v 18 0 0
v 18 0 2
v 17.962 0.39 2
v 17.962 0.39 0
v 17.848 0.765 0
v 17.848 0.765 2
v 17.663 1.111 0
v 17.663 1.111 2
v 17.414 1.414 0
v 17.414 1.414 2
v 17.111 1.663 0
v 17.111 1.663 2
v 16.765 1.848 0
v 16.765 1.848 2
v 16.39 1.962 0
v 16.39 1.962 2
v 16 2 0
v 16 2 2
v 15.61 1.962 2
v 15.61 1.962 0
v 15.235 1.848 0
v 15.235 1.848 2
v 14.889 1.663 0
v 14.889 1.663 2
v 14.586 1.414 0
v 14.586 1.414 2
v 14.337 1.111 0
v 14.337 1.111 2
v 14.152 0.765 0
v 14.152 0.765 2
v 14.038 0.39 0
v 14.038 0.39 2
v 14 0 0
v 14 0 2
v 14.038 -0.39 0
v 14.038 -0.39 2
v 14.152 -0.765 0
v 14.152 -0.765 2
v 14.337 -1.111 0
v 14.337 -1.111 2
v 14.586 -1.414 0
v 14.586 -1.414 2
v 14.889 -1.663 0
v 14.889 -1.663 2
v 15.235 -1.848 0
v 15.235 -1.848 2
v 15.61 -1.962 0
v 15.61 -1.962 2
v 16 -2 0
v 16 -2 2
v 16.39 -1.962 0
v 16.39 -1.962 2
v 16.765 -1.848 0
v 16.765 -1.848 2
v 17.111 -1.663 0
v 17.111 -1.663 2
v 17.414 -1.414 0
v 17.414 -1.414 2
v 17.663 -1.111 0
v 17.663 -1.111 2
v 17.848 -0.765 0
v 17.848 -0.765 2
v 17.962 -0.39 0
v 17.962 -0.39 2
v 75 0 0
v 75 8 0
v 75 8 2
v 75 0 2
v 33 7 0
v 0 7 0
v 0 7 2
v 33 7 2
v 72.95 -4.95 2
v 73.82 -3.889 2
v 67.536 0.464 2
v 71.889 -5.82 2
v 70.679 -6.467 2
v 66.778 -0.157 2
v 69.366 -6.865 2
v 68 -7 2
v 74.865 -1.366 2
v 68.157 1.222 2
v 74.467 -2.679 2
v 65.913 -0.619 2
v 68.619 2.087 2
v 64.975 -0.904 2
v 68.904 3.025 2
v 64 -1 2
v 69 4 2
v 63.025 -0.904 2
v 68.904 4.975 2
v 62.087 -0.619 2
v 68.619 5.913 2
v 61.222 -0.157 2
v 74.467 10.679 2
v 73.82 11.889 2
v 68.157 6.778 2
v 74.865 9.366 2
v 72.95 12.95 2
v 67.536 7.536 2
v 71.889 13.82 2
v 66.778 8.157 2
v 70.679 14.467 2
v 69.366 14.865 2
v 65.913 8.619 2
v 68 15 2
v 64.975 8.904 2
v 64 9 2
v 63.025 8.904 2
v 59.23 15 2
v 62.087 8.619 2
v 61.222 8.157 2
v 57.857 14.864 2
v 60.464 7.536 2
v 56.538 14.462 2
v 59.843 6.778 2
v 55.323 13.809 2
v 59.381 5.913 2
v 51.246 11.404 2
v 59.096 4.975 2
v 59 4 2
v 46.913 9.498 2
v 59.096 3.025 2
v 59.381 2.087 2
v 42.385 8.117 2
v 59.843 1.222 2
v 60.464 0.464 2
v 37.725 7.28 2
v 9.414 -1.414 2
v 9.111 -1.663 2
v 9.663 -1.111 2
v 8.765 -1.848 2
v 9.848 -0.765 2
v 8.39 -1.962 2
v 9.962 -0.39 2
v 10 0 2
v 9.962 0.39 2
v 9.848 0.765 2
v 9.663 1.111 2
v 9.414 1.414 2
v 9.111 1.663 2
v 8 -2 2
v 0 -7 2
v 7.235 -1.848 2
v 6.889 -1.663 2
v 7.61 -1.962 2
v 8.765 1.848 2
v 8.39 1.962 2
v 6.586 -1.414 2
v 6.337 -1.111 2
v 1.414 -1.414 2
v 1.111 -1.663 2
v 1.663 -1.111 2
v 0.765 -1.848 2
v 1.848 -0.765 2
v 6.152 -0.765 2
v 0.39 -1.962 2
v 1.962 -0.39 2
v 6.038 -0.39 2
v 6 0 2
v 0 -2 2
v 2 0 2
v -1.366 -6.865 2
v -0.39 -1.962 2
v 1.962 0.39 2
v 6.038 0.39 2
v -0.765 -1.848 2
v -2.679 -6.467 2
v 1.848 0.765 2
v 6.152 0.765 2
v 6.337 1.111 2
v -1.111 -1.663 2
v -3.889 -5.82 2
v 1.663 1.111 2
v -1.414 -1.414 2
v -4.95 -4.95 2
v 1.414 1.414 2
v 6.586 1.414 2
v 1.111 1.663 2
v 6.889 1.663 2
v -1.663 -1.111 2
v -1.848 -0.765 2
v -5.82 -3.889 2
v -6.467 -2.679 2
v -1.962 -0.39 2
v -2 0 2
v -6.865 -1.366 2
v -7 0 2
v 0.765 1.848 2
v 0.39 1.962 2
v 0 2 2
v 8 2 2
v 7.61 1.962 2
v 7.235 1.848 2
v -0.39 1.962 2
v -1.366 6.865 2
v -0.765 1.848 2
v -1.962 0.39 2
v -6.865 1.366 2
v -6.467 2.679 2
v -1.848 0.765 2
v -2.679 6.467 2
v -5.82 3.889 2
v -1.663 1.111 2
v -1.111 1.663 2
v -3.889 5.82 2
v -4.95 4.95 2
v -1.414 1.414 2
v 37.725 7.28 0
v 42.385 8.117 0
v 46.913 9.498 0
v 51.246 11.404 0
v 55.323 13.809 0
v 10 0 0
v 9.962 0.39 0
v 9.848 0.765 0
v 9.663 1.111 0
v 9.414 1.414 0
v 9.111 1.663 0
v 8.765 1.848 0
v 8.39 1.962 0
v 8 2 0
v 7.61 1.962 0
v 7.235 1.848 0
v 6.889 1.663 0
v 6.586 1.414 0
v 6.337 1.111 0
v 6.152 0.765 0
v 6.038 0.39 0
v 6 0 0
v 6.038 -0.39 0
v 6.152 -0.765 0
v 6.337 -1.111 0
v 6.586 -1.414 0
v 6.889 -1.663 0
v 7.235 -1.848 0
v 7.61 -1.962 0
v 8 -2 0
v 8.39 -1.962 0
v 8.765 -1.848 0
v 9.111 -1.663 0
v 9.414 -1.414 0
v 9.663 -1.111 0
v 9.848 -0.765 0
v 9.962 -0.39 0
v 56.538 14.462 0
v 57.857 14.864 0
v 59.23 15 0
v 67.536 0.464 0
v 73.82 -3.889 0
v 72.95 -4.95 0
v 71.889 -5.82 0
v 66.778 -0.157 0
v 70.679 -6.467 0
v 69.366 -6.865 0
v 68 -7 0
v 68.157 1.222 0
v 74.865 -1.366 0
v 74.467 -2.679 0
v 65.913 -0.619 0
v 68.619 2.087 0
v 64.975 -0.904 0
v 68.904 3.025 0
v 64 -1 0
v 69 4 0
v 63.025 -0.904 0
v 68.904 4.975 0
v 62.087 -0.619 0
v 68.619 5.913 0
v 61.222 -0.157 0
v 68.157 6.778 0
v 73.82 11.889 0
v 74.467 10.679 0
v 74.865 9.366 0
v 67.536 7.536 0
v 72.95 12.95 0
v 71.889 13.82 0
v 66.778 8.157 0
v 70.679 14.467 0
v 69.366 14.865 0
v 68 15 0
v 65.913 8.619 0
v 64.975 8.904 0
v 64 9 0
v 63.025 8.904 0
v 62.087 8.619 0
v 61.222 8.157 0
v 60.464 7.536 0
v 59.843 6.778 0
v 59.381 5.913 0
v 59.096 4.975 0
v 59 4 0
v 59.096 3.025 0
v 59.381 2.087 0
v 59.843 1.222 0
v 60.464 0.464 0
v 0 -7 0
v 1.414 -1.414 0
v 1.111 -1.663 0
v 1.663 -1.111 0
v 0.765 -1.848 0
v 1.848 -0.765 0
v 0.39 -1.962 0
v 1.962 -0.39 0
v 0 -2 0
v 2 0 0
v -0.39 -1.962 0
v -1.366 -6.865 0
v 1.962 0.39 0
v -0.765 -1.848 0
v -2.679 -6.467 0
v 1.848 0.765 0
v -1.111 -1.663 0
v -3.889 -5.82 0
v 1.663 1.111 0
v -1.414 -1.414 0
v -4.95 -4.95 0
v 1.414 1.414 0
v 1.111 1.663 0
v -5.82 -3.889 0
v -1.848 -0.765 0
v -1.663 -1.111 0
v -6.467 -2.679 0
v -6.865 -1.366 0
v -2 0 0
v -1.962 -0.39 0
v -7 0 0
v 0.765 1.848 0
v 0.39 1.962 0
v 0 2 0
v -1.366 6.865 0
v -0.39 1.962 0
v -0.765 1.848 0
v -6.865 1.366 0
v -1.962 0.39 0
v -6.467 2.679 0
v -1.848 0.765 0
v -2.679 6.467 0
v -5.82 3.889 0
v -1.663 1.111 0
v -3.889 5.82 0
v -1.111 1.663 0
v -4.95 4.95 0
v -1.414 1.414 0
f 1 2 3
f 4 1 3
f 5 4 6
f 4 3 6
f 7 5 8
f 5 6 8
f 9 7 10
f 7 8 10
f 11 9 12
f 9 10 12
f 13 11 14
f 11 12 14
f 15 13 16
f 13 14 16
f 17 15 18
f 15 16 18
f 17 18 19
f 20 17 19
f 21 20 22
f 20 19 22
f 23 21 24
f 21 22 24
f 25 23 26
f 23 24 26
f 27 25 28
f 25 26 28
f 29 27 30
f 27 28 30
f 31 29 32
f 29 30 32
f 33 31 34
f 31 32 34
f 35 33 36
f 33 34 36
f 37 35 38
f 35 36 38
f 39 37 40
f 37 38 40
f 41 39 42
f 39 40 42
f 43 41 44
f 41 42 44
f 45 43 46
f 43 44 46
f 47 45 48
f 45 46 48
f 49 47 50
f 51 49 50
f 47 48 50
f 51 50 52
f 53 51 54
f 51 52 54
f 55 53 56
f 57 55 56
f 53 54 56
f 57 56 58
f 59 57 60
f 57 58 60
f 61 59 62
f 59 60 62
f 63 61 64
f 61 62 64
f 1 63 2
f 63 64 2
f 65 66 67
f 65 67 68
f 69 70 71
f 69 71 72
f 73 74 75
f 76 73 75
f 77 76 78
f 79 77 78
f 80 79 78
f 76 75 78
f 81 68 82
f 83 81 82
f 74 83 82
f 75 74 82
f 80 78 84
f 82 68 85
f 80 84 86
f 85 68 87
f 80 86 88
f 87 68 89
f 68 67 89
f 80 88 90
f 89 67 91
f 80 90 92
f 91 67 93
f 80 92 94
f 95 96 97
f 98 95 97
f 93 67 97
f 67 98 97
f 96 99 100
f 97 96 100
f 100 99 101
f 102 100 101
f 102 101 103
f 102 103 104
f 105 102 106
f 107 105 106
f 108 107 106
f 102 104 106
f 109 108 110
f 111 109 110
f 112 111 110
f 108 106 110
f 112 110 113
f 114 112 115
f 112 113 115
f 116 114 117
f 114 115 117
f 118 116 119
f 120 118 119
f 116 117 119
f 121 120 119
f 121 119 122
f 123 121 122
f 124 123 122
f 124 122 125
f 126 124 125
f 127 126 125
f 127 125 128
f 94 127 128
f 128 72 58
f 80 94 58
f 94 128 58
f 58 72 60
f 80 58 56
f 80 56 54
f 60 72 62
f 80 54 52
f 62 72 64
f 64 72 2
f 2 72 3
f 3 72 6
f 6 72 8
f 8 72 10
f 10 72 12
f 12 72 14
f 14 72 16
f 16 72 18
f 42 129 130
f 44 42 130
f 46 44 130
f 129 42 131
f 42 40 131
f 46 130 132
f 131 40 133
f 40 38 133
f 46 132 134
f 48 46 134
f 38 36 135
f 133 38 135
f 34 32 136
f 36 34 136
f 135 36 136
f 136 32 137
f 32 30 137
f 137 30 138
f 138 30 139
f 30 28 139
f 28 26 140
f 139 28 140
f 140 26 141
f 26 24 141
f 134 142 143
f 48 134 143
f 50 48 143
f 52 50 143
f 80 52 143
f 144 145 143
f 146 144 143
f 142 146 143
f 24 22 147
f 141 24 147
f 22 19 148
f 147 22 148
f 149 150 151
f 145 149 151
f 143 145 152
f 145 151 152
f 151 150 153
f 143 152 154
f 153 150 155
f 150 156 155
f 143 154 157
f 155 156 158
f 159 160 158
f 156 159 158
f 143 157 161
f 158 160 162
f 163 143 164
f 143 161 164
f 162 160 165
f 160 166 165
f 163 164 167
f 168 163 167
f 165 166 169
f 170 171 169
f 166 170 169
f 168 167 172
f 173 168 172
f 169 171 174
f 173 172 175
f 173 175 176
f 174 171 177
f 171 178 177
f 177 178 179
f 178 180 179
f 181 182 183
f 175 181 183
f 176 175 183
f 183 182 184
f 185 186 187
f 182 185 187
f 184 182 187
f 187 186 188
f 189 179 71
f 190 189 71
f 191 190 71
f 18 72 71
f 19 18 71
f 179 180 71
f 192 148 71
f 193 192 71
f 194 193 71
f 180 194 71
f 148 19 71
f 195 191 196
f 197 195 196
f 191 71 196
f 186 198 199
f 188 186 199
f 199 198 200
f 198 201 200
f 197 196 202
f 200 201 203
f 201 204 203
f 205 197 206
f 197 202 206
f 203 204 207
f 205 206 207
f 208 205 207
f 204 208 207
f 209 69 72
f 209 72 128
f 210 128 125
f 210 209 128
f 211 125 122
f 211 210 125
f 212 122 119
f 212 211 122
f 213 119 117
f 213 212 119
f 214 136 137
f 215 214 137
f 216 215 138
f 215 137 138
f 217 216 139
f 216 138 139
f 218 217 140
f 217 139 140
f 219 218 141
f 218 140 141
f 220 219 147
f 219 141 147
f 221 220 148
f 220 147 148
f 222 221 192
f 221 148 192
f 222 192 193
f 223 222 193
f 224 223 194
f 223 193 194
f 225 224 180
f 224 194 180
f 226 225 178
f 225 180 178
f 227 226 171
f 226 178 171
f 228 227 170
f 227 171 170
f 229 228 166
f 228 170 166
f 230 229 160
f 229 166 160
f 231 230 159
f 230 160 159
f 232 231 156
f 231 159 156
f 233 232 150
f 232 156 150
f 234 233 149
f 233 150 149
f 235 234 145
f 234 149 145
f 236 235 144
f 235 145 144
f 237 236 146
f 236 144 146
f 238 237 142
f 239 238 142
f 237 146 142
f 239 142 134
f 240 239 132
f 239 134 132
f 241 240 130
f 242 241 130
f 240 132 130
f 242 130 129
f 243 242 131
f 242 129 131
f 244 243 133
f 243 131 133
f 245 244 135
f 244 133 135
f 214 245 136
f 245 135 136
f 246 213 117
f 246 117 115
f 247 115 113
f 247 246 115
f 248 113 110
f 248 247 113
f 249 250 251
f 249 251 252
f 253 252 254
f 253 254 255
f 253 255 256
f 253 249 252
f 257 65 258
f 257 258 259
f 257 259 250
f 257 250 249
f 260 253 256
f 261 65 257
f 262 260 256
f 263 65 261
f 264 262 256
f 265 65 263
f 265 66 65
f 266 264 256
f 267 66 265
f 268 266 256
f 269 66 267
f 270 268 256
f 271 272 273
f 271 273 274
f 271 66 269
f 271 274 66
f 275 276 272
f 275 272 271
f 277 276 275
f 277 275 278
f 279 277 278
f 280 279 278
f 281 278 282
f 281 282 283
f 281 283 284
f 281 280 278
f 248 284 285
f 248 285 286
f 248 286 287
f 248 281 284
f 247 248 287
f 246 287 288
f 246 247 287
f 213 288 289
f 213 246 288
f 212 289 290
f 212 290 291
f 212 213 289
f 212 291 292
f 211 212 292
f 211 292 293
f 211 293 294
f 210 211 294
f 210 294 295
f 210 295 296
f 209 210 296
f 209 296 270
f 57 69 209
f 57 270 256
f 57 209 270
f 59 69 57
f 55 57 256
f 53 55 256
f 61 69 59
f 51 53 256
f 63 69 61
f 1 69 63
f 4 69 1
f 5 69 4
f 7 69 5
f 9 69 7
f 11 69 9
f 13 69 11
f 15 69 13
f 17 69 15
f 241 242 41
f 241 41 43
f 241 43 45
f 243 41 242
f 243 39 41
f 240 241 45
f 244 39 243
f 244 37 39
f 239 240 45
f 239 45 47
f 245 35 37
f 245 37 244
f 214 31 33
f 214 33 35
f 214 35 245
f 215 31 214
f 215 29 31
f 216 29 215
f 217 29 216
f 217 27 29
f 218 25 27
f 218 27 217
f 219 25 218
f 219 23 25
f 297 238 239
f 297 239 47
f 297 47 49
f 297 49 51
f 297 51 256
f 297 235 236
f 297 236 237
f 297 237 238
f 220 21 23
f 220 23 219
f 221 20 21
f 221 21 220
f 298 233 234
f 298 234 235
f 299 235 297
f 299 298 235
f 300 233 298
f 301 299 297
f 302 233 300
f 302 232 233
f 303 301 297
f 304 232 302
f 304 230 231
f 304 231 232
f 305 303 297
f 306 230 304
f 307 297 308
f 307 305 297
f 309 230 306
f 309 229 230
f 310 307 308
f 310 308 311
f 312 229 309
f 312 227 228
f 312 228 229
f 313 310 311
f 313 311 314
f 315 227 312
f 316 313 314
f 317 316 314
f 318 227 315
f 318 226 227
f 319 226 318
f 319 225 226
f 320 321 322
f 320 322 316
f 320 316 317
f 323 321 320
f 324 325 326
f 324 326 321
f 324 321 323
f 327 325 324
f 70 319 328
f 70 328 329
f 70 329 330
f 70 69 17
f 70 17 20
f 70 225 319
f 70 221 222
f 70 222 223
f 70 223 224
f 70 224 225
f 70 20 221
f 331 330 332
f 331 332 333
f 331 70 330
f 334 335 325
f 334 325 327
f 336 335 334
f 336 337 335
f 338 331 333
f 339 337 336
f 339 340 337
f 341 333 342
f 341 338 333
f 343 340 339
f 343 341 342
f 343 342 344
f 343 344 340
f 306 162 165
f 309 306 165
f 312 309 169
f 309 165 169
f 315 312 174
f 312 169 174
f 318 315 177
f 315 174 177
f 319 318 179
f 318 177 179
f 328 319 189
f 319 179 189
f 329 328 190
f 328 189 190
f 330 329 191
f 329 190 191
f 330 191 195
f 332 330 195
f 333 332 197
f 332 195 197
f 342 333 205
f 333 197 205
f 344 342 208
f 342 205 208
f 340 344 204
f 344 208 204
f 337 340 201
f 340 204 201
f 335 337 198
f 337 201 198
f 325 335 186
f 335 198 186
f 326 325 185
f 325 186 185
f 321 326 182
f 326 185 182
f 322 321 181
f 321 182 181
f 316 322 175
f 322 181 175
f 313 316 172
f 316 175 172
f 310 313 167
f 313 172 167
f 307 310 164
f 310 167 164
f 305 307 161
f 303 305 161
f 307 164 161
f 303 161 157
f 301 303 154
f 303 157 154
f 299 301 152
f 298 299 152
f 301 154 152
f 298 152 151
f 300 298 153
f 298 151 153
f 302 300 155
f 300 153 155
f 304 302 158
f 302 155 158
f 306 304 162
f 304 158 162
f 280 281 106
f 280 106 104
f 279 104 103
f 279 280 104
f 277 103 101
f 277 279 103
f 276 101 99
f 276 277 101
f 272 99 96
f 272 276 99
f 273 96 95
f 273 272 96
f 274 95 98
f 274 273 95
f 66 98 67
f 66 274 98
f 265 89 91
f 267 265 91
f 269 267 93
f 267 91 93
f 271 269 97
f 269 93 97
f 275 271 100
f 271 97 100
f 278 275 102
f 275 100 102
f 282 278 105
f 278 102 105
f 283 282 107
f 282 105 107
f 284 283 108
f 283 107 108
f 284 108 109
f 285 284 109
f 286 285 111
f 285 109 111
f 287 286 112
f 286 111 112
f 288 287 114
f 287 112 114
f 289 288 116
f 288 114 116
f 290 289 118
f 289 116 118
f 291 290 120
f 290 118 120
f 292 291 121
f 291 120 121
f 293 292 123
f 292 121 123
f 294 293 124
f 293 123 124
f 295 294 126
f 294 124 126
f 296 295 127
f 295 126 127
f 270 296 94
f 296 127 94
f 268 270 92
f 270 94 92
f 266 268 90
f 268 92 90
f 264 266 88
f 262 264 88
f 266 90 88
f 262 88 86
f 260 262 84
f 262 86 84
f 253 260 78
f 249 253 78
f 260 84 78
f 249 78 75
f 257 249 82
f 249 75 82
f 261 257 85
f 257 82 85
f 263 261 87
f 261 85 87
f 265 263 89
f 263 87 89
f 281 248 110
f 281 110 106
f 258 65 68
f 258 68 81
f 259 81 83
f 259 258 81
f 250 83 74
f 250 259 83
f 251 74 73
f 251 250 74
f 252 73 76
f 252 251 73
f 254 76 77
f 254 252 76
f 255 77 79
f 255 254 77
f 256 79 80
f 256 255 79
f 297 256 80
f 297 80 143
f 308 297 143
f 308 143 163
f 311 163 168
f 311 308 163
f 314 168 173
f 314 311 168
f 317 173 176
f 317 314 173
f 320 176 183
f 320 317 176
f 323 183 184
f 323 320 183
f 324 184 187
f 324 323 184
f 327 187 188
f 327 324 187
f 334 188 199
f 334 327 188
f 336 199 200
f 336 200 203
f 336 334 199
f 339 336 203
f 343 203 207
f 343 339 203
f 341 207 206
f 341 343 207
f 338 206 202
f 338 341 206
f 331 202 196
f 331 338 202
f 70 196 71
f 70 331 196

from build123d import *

# Parameters (mm, degrees)
BOSS_EXTRUDE1_DEPTH = 2
SKETCH2_R           = 2
CUT_EXTRUDE1_DEPTH  = 2
SKETCH3_R           = 5
CUT_EXTRUDE2_DEPTH  = 2


with BuildPart() as part:
    # Sketch1 → Boss-Extrude1 (new body)
    with BuildSketch(Plane.XY):
        with BuildLine():
            Line((0, 7), (33, 7))
            ThreePointArc((33, 7), (44.66919932, 8.739971416), (55.323194976, 13.808510638))
            ThreePointArc((55.323194976, 13.808510638), (57.187644216, 14.695505002), (59.229754097, 15))
            Line((59.229754097, 15), (68, 15))
            ThreePointArc((68, 15), (72.949747468, 12.949747468), (75, 8))
            Line((75, 8), (75, 0))
            ThreePointArc((75, 0), (72.949747468, -4.949747468), (68, -7))
            Line((68, -7), (0, -7))
            ThreePointArc((0, -7), (-7, 0), (0, 7))
        make_face()
    extrude(amount=BOSS_EXTRUDE1_DEPTH)

    # Sketch2 → Cut-Extrude1 (cut)
    with BuildSketch(Plane.XY.offset(2)):
        Circle(SKETCH2_R)
        with Locations((8, 0)):
            Circle(SKETCH2_R)
        with Locations((16, 0)):
            Circle(SKETCH2_R)
    extrude(amount=-CUT_EXTRUDE1_DEPTH, mode=Mode.SUBTRACT)

    # Sketch3 → Cut-Extrude2 (cut)
    with BuildSketch(Plane.XY.offset(2)):
        with Locations((64, 4)):
            Circle(SKETCH3_R)
    extrude(amount=-CUT_EXTRUDE2_DEPTH, mode=Mode.SUBTRACT)


solid = part.part
